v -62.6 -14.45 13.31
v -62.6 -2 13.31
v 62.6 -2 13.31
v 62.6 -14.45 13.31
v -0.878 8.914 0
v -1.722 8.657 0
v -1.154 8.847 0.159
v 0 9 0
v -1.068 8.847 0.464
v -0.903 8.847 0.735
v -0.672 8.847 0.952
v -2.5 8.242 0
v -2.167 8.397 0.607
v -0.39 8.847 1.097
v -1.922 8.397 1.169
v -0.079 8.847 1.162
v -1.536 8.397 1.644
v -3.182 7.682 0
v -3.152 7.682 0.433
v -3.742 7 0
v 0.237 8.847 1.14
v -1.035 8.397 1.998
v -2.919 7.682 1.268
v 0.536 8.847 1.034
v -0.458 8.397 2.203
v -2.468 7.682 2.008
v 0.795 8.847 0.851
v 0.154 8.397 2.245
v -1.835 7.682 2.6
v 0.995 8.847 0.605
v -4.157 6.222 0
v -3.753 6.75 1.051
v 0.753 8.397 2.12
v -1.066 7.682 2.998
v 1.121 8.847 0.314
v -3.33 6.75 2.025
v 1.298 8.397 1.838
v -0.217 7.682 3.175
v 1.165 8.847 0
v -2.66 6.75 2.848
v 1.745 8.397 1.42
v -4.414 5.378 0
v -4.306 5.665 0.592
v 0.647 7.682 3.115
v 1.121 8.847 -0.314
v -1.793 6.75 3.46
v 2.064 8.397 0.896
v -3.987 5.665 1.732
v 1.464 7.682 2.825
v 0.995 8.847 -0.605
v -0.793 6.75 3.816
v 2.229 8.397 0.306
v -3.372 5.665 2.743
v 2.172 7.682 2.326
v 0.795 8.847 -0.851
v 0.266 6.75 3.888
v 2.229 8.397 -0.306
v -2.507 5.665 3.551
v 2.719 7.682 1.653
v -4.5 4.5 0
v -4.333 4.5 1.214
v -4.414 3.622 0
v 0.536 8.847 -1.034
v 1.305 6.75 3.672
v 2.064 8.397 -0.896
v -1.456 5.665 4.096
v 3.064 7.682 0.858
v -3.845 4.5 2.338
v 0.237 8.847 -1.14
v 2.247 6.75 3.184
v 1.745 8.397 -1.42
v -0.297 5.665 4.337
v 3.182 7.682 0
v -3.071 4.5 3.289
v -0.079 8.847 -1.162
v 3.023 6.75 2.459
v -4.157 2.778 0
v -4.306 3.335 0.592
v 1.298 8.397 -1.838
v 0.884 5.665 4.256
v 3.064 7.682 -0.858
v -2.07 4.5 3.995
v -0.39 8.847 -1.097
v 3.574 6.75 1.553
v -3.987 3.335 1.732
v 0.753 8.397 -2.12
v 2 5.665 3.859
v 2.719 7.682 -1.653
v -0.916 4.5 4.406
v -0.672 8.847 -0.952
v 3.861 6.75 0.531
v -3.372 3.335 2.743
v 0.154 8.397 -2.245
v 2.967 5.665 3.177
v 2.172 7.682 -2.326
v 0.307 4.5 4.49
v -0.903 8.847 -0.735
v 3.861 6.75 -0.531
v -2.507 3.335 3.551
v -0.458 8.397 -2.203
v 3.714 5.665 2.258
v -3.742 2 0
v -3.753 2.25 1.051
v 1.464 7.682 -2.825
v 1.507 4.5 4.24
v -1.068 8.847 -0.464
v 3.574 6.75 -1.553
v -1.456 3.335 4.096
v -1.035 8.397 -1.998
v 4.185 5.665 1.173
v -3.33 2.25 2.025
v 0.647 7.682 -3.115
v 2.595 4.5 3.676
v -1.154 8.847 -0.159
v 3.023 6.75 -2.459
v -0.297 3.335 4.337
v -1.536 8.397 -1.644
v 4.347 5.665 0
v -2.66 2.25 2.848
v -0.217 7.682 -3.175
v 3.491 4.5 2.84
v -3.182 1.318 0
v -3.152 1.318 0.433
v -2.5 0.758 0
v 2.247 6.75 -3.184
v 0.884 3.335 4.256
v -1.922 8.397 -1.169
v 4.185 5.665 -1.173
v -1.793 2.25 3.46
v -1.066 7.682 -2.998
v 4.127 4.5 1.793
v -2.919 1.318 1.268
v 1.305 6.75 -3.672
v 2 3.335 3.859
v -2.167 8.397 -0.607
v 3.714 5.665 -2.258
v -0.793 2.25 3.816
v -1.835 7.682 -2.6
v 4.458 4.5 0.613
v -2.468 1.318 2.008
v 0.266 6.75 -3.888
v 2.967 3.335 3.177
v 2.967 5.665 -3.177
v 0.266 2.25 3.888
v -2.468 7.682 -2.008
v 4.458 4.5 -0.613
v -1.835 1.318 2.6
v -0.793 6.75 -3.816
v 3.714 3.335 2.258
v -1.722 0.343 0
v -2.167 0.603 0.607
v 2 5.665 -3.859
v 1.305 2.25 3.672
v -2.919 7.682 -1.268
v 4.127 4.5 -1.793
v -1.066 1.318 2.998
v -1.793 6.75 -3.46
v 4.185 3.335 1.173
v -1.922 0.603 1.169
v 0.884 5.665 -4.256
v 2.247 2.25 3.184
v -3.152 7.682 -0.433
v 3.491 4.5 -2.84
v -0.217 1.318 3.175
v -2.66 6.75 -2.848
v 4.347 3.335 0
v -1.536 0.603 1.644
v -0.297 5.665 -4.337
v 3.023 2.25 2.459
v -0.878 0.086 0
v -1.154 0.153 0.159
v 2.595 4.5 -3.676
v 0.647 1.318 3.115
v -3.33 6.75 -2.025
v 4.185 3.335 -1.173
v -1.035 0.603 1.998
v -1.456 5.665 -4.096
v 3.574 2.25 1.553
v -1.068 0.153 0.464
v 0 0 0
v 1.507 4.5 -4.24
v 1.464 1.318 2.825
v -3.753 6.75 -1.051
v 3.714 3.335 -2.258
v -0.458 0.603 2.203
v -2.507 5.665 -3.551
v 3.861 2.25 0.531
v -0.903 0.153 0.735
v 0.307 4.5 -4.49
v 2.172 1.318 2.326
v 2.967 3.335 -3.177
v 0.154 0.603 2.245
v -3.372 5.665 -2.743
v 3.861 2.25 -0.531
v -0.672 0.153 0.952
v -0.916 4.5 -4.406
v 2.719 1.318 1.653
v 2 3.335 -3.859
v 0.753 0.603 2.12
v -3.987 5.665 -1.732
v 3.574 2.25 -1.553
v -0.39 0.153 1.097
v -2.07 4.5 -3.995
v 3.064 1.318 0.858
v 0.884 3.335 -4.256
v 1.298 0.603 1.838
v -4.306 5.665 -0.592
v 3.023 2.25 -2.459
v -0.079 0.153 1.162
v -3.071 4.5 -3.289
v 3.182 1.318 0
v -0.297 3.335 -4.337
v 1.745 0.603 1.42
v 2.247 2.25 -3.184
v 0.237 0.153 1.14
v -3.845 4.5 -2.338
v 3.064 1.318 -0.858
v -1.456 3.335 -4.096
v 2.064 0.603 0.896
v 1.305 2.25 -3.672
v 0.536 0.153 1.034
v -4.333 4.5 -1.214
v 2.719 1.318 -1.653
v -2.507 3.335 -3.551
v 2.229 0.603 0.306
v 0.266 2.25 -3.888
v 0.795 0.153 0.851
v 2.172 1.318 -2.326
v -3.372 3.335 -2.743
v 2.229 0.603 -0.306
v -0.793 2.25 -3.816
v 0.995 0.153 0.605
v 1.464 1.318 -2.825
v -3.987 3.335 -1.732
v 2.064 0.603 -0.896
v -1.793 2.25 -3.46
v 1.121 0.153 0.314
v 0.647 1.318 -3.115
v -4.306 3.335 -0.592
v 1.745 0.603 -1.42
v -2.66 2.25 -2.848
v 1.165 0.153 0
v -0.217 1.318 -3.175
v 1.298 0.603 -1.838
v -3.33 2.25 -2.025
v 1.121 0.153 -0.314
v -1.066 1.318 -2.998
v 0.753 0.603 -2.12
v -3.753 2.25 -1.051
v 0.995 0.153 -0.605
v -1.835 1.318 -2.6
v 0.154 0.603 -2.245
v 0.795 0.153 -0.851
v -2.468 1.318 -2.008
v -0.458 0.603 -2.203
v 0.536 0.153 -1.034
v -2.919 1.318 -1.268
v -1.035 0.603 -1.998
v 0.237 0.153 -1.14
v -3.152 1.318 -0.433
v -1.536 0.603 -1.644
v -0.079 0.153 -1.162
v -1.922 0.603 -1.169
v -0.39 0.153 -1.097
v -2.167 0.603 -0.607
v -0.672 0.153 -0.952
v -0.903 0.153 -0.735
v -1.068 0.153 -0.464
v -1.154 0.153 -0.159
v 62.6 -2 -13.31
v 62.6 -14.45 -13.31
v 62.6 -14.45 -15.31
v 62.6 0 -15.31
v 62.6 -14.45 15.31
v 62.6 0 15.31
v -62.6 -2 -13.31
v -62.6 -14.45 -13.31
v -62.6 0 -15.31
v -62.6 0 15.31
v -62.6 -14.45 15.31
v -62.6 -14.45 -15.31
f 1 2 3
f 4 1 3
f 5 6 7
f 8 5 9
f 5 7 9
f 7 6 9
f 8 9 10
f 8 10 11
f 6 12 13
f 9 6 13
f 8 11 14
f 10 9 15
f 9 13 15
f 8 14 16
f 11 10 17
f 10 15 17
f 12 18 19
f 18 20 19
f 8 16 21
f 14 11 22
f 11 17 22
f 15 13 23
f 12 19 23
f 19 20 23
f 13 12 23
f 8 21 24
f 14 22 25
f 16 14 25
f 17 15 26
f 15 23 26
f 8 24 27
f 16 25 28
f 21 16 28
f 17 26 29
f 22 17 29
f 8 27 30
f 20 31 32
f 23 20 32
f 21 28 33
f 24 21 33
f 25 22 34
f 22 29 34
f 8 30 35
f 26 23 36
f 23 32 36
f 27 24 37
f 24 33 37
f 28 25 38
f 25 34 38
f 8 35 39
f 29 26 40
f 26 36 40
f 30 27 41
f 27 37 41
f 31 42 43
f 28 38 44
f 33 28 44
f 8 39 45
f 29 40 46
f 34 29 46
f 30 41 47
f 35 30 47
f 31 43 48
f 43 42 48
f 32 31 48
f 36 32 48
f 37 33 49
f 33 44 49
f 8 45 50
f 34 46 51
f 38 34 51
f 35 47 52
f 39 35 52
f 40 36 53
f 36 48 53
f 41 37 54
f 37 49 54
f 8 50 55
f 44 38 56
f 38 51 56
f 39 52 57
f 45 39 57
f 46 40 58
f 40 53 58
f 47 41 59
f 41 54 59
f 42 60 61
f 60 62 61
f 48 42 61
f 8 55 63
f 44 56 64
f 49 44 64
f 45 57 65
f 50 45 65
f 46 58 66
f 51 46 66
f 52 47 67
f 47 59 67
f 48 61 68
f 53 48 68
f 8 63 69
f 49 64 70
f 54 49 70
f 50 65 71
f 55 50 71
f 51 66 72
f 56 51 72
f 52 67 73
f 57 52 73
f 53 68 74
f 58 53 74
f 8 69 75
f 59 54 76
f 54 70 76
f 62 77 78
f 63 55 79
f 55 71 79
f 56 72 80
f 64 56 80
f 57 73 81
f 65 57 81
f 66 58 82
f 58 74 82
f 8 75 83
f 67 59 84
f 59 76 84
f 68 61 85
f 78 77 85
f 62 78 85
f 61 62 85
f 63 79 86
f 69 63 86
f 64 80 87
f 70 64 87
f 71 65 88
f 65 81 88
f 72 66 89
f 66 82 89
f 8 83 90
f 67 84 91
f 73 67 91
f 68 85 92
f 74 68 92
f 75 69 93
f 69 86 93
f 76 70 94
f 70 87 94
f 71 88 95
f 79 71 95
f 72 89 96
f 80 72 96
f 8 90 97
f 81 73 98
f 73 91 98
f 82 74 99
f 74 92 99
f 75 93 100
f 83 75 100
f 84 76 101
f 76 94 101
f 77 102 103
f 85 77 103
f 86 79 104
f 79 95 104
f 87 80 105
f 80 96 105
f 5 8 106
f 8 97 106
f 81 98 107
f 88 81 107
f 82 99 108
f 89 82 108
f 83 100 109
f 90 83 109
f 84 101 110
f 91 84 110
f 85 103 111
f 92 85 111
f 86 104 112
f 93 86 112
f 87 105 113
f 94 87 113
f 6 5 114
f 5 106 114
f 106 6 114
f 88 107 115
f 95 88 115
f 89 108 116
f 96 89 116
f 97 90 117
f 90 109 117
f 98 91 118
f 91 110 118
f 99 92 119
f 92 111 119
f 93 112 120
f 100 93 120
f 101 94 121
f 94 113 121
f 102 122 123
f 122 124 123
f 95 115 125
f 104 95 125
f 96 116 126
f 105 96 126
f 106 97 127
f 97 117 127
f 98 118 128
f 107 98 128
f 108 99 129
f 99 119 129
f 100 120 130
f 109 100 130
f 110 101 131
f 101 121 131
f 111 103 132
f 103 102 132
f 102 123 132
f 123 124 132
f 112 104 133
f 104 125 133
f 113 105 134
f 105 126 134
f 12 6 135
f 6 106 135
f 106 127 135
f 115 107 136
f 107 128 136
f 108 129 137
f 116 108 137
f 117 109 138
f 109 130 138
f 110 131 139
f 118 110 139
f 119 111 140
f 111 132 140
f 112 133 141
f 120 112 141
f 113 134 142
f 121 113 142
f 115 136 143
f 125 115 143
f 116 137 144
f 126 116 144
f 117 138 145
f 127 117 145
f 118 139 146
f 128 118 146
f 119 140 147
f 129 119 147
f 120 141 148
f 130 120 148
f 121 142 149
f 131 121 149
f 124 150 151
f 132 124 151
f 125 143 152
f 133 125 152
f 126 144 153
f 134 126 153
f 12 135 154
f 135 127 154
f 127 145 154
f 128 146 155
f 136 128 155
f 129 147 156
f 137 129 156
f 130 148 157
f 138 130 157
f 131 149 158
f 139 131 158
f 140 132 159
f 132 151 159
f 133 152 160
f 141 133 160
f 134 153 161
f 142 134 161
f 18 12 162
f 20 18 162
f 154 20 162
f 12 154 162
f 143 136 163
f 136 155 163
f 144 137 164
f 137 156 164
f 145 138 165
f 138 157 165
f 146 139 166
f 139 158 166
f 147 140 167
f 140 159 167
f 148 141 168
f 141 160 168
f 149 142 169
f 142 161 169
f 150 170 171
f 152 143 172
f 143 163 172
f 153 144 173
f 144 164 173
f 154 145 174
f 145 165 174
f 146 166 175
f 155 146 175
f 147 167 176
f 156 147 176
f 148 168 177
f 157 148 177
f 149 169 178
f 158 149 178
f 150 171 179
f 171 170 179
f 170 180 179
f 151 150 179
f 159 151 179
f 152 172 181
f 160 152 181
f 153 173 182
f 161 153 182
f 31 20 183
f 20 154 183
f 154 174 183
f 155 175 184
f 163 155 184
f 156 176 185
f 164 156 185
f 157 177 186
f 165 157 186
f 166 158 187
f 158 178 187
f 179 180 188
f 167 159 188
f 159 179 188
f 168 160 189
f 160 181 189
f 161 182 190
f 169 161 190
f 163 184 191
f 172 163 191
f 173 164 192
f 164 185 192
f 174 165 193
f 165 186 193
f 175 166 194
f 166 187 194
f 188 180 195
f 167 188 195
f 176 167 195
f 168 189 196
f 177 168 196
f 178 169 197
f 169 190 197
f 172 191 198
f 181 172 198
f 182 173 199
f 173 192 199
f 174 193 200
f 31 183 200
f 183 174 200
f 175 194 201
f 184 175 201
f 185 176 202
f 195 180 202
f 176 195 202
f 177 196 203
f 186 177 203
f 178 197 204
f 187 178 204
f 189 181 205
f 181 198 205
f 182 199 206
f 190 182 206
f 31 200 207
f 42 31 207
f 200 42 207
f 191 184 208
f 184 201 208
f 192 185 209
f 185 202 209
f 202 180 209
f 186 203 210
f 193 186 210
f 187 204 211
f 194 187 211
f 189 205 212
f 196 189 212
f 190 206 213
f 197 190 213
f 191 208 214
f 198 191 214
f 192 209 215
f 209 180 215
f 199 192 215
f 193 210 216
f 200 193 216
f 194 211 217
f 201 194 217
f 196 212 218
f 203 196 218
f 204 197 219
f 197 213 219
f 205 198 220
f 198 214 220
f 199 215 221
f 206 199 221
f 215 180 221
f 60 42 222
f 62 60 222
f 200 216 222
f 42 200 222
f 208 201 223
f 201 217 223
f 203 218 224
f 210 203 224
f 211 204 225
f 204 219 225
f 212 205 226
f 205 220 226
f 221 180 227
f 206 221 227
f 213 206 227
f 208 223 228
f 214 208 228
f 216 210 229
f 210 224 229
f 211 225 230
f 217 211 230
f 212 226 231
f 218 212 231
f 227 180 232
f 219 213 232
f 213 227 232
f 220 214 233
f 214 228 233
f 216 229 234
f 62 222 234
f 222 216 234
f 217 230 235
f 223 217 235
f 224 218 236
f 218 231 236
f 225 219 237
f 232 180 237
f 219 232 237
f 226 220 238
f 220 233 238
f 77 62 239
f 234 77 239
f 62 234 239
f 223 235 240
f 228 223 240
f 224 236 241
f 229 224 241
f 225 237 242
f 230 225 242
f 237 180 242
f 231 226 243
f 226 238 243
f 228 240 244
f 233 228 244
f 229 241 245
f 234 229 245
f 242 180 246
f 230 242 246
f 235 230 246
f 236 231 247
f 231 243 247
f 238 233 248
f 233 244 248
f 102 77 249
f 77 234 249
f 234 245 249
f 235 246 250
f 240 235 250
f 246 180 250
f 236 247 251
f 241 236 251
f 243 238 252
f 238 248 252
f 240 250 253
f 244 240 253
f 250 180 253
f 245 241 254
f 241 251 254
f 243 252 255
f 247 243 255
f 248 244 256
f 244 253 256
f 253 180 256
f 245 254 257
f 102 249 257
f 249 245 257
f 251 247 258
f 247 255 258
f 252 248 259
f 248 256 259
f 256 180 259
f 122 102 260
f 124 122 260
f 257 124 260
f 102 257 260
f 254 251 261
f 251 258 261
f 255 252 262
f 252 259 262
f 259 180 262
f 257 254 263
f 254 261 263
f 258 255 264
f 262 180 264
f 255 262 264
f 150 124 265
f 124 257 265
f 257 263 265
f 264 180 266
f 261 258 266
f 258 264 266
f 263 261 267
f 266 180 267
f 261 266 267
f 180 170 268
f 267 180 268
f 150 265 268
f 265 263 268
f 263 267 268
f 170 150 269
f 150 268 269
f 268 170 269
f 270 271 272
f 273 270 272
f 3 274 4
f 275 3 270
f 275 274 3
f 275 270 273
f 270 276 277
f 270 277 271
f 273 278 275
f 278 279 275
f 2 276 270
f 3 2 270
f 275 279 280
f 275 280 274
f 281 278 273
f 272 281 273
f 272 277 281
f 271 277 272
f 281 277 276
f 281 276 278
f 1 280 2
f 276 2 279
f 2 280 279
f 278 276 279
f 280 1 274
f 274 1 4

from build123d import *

# Parameters (mm, degrees)
ESBO_O4_W                = 125.2
ESBO_O4_H                = 26.62
RESSALTO_EXTRUS_O1_DEPTH = 2
RESSALTO_EXTRUS_O2_START = 13.31
ESBO_O5_W                = 125.2
ESBO_O5_H                = 14.45
RESSALTO_EXTRUS_O2_DEPTH = 2
RESSALTO_EXTRUS_O3_START = -13.31
ESBO_O6_W                = 125.2
ESBO_O6_H                = 14.45
RESSALTO_EXTRUS_O3_DEPTH = 2


with BuildPart() as part:
    # Esboço3 → Revolução1 (revolve)
    with BuildSketch(Plane.XY):
        with BuildLine():
            Line((0, 0), (0, 9))
            ThreePointArc((0, 9), (-4.5, 4.5), (0, 0))
        make_face()
    revolve(axis=Axis((0, 0, 0), (0, 1, 0)))


with BuildPart() as body_2:
    # Esboço4 → Ressalto-extrusão1 (new body)
    with BuildSketch(Plane(origin=(0, 0, 0), x_dir=(1, 0, 0), z_dir=(0, 1, 0))):
        Rectangle(ESBO_O4_W, ESBO_O4_H)
    extrude(amount=-RESSALTO_EXTRUS_O1_DEPTH)

    # Esboço5 → Ressalto-extrusão2 (add)
    with BuildSketch(Plane.XY.offset(RESSALTO_EXTRUS_O2_START)):
        with Locations((0, -7.225)):
            Rectangle(ESBO_O5_W, ESBO_O5_H)
    extrude(amount=RESSALTO_EXTRUS_O2_DEPTH)

    # Esboço6 → Ressalto-extrusão3 (add)
    with BuildSketch(Plane.XY.offset(RESSALTO_EXTRUS_O3_START)):
        with Locations((0, -7.225)):
            Rectangle(ESBO_O6_W, ESBO_O6_H)
    extrude(amount=-RESSALTO_EXTRUS_O3_DEPTH)


solid = Compound([part.part, body_2.part])
